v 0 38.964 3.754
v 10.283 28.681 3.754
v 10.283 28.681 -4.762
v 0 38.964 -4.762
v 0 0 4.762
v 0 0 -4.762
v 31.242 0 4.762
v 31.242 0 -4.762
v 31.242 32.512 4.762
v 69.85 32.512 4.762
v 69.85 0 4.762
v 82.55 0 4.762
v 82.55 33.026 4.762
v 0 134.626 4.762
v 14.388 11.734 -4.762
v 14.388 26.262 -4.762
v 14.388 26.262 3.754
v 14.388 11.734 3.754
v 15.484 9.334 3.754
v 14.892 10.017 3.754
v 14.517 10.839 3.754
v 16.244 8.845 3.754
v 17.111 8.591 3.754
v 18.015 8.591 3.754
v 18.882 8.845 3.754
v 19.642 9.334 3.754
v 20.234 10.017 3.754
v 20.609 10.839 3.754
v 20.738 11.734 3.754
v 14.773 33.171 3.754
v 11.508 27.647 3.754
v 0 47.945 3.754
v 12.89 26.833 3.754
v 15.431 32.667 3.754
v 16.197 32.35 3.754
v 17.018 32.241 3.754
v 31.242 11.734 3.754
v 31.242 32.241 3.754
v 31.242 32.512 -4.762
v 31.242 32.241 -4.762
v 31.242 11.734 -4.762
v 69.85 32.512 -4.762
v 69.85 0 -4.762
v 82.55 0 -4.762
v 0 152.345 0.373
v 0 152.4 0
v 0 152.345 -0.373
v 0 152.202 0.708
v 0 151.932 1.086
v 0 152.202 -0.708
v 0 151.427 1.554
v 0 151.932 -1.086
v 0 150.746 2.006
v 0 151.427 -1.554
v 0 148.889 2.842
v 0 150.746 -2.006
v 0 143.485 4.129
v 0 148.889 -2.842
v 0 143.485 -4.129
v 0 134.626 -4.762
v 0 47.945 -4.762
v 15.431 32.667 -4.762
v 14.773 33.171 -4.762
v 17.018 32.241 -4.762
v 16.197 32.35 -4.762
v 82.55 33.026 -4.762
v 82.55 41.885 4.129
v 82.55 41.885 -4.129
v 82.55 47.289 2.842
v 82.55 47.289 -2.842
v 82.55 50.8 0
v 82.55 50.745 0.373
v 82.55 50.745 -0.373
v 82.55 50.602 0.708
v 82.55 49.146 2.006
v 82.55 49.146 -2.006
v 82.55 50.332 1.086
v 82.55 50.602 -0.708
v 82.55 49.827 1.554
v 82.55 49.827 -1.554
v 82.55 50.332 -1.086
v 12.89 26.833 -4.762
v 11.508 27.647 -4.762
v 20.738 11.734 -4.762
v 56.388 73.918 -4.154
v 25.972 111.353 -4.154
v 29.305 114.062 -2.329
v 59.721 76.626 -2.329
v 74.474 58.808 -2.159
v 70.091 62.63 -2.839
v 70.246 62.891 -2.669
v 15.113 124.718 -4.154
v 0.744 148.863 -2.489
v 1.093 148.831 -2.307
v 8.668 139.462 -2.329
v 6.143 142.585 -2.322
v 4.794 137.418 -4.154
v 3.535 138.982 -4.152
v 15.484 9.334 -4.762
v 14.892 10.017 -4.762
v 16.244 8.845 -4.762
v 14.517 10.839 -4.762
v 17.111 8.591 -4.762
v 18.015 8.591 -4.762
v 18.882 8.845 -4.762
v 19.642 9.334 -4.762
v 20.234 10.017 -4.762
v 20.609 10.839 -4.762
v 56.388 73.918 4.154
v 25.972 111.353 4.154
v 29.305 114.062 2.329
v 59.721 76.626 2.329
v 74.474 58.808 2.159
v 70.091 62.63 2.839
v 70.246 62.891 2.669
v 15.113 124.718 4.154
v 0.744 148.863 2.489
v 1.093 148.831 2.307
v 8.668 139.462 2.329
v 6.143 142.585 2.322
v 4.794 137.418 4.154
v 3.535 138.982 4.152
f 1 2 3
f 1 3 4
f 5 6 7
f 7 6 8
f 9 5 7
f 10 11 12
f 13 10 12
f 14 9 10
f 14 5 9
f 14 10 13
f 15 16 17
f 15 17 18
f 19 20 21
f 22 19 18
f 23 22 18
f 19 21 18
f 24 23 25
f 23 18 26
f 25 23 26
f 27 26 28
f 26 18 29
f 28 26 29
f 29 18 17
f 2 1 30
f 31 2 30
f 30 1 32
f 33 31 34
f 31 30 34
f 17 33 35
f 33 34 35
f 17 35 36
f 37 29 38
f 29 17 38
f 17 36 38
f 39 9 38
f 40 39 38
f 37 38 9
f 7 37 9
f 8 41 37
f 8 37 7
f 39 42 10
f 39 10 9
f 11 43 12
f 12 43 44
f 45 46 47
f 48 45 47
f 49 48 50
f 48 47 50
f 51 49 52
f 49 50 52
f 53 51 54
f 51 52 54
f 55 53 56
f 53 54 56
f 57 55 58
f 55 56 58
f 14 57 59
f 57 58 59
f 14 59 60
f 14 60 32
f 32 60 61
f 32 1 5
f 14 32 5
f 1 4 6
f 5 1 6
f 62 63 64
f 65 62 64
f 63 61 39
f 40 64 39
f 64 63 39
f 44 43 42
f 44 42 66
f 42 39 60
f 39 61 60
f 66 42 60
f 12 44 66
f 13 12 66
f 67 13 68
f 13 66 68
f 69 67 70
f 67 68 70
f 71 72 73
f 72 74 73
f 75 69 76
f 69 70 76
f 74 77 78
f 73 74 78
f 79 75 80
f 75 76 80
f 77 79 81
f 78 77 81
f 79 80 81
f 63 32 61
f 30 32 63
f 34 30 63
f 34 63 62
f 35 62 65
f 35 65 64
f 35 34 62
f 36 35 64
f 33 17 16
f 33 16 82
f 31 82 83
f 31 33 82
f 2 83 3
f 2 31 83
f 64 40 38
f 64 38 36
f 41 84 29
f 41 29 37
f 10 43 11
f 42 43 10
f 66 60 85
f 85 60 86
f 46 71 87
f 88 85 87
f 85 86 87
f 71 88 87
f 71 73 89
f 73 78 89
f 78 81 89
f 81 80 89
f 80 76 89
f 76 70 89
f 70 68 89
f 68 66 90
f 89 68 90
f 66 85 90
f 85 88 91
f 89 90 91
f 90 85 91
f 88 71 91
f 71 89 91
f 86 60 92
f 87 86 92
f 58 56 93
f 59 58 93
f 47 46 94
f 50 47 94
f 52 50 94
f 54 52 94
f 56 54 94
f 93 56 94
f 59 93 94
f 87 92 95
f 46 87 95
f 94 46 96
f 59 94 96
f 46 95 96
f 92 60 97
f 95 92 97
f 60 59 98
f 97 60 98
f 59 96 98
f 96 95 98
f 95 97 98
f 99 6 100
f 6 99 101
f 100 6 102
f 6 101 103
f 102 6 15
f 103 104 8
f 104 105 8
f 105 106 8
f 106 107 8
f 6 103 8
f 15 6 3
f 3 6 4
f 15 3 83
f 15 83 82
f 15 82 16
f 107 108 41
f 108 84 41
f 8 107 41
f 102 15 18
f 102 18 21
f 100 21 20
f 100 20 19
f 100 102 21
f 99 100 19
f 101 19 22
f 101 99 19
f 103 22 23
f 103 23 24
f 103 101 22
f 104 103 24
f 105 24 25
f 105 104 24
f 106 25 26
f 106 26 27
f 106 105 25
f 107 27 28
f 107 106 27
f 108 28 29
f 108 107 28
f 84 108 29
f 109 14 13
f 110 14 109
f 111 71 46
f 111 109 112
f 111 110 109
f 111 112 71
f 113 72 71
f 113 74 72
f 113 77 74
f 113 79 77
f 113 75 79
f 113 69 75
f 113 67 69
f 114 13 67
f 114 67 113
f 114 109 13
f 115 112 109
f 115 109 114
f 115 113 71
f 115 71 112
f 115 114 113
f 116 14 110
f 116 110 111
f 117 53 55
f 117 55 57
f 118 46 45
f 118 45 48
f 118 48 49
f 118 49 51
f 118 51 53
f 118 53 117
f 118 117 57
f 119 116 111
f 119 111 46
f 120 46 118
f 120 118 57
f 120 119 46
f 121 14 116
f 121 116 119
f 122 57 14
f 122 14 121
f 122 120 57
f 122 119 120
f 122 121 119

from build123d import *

# Parameters (mm, degrees)
CORE_DEPTH                = 4.7625
CORE_DEPTH_BACK           = 4.7625
LEADINGEDGE_START         = -118.279773997
LEADINGEDGE_DEPTH         = 144.703179824
CTRLSURFCUTOUT_DEPTH      = 174.386689122
CTRLSURFCUTOUT_DEPTH_BACK = 174.386689122
SERVOPKT_DEPTH            = 8.516499985
WIREPKT_START             = -8.516499985
WIREPKT_DEPTH             = 8.516499985


# Read off the part's stored shape, not the designer's step: LeadingEdge, WirePkt
with BuildPart() as part:
    # Sketch2 → Core (new, two sides: drawn at the far end of the back side and taken through both)
    with BuildSketch(Plane.XY.offset(-CORE_DEPTH_BACK)):
        Polygon((0, 0), (82.55, 0), (82.55, 50.8), (0, 152.4), align=None)
    extrude(amount=CORE_DEPTH + CORE_DEPTH_BACK)

    # LeadingEdge outline → LeadingEdge (cut)
    with BuildSketch(Plane(origin=(0, 0, 0), x_dir=(0.7761140001162661, 0.630592625094465, 0), z_dir=(0.6305926250944651, -0.776114000116266, 0)).offset(LEADINGEDGE_START)):
        with BuildLine():
            Line((96.102316064, 4.7625), (84.894223283, 4.7625))
            add(Edge.make_bspline(
                [(84.894223283, 4.7625), (91.459772026, 4.7625), (96.102316064, 2.789807909), (96.102316064, 0)],
                knots=[0, 0, 0, 0, 1, 1, 1, 1], degree=3, weights=[1, 0.804737854, 0.804737854, 1]))
            Line((96.102316064, 0), (96.102316064, 4.7625))
        make_face()
    leadingedge = extrude(amount=LEADINGEDGE_DEPTH, mode=Mode.SUBTRACT)

    # LeadingEdgeMirror: LeadingEdge across plane
    add(leadingedge.mirror(Plane.XY), mode=Mode.SUBTRACT)

    # Sketch4 → CtrlSurfCutout (cut, two sides: drawn at the far end of the back side and taken through both)
    with BuildSketch(Plane.XY.offset(-CTRLSURFCUTOUT_DEPTH_BACK)):
        Polygon((31.242, 0), (69.85, 0), (69.85, 31.75), (69.85, 32.512), (69.596, 32.512), (31.496, 32.512), (31.242, 32.512), align=None)
    extrude(amount=CTRLSURFCUTOUT_DEPTH + CTRLSURFCUTOUT_DEPTH_BACK, mode=Mode.SUBTRACT)

    # Sketch7 → ServoPkt (cut)
    with BuildSketch(Plane(origin=(0, 0, -4.7625), x_dir=(-1, 0, 0), z_dir=(0, 0, -1))):
        with BuildLine():
            Line((-31.242, 32.241499906), (-17.562999926, 32.241499906))
            ThreePointArc((-17.562999926, 32.241499906), (-15.317935896, 31.311563936), (-14.387999926, 29.066499906))
            Line((-14.387999926, 29.066499906), (-14.387999926, 11.733500028))
            ThreePointArc((-14.387999926, 11.733500028), (-17.562999926, 8.558500028), (-20.737999926, 11.733500028))
            Line((-20.737999926, 11.733500028), (-31.242, 11.733500028))
            Line((-31.242, 11.733500028), (-31.242, 32.241499906))
        make_face()
    extrude(amount=-SERVOPKT_DEPTH, mode=Mode.SUBTRACT)

    # WirePkt outline → WirePkt (cut)
    with BuildSketch(Plane(origin=(0, 0, -4.7625), x_dir=(-1, 0, 0), z_dir=(0, 0, -1)).offset(WIREPKT_START)):
        with BuildLine():
            Line((-14.387999926, 29.066499906), (-14.387999926, 26.261862953))
            ThreePointArc((-14.387999926, 26.261862953), (-12.181797279, 27.210752433), (-10.283063956, 28.681307815))
            Line((-10.283063956, 28.681307815), (0, 38.964371771))
            Line((0, 38.964371771), (0, 47.944627893))
            Line((0, 47.944627893), (-14.773192017, 33.171435876))
            ThreePointArc((-14.773192017, 33.171435876), (-15.803236149, 32.48318239), (-17.018256047, 32.241499906))
            Line((-17.018256047, 32.241499906), (-17.562999926, 32.241499906))
            ThreePointArc((-17.562999926, 32.241499906), (-15.317935896, 31.311563936), (-14.387999926, 29.066499906))
        make_face()
    extrude(amount=WIREPKT_DEPTH, mode=Mode.SUBTRACT)


solid = part.part
